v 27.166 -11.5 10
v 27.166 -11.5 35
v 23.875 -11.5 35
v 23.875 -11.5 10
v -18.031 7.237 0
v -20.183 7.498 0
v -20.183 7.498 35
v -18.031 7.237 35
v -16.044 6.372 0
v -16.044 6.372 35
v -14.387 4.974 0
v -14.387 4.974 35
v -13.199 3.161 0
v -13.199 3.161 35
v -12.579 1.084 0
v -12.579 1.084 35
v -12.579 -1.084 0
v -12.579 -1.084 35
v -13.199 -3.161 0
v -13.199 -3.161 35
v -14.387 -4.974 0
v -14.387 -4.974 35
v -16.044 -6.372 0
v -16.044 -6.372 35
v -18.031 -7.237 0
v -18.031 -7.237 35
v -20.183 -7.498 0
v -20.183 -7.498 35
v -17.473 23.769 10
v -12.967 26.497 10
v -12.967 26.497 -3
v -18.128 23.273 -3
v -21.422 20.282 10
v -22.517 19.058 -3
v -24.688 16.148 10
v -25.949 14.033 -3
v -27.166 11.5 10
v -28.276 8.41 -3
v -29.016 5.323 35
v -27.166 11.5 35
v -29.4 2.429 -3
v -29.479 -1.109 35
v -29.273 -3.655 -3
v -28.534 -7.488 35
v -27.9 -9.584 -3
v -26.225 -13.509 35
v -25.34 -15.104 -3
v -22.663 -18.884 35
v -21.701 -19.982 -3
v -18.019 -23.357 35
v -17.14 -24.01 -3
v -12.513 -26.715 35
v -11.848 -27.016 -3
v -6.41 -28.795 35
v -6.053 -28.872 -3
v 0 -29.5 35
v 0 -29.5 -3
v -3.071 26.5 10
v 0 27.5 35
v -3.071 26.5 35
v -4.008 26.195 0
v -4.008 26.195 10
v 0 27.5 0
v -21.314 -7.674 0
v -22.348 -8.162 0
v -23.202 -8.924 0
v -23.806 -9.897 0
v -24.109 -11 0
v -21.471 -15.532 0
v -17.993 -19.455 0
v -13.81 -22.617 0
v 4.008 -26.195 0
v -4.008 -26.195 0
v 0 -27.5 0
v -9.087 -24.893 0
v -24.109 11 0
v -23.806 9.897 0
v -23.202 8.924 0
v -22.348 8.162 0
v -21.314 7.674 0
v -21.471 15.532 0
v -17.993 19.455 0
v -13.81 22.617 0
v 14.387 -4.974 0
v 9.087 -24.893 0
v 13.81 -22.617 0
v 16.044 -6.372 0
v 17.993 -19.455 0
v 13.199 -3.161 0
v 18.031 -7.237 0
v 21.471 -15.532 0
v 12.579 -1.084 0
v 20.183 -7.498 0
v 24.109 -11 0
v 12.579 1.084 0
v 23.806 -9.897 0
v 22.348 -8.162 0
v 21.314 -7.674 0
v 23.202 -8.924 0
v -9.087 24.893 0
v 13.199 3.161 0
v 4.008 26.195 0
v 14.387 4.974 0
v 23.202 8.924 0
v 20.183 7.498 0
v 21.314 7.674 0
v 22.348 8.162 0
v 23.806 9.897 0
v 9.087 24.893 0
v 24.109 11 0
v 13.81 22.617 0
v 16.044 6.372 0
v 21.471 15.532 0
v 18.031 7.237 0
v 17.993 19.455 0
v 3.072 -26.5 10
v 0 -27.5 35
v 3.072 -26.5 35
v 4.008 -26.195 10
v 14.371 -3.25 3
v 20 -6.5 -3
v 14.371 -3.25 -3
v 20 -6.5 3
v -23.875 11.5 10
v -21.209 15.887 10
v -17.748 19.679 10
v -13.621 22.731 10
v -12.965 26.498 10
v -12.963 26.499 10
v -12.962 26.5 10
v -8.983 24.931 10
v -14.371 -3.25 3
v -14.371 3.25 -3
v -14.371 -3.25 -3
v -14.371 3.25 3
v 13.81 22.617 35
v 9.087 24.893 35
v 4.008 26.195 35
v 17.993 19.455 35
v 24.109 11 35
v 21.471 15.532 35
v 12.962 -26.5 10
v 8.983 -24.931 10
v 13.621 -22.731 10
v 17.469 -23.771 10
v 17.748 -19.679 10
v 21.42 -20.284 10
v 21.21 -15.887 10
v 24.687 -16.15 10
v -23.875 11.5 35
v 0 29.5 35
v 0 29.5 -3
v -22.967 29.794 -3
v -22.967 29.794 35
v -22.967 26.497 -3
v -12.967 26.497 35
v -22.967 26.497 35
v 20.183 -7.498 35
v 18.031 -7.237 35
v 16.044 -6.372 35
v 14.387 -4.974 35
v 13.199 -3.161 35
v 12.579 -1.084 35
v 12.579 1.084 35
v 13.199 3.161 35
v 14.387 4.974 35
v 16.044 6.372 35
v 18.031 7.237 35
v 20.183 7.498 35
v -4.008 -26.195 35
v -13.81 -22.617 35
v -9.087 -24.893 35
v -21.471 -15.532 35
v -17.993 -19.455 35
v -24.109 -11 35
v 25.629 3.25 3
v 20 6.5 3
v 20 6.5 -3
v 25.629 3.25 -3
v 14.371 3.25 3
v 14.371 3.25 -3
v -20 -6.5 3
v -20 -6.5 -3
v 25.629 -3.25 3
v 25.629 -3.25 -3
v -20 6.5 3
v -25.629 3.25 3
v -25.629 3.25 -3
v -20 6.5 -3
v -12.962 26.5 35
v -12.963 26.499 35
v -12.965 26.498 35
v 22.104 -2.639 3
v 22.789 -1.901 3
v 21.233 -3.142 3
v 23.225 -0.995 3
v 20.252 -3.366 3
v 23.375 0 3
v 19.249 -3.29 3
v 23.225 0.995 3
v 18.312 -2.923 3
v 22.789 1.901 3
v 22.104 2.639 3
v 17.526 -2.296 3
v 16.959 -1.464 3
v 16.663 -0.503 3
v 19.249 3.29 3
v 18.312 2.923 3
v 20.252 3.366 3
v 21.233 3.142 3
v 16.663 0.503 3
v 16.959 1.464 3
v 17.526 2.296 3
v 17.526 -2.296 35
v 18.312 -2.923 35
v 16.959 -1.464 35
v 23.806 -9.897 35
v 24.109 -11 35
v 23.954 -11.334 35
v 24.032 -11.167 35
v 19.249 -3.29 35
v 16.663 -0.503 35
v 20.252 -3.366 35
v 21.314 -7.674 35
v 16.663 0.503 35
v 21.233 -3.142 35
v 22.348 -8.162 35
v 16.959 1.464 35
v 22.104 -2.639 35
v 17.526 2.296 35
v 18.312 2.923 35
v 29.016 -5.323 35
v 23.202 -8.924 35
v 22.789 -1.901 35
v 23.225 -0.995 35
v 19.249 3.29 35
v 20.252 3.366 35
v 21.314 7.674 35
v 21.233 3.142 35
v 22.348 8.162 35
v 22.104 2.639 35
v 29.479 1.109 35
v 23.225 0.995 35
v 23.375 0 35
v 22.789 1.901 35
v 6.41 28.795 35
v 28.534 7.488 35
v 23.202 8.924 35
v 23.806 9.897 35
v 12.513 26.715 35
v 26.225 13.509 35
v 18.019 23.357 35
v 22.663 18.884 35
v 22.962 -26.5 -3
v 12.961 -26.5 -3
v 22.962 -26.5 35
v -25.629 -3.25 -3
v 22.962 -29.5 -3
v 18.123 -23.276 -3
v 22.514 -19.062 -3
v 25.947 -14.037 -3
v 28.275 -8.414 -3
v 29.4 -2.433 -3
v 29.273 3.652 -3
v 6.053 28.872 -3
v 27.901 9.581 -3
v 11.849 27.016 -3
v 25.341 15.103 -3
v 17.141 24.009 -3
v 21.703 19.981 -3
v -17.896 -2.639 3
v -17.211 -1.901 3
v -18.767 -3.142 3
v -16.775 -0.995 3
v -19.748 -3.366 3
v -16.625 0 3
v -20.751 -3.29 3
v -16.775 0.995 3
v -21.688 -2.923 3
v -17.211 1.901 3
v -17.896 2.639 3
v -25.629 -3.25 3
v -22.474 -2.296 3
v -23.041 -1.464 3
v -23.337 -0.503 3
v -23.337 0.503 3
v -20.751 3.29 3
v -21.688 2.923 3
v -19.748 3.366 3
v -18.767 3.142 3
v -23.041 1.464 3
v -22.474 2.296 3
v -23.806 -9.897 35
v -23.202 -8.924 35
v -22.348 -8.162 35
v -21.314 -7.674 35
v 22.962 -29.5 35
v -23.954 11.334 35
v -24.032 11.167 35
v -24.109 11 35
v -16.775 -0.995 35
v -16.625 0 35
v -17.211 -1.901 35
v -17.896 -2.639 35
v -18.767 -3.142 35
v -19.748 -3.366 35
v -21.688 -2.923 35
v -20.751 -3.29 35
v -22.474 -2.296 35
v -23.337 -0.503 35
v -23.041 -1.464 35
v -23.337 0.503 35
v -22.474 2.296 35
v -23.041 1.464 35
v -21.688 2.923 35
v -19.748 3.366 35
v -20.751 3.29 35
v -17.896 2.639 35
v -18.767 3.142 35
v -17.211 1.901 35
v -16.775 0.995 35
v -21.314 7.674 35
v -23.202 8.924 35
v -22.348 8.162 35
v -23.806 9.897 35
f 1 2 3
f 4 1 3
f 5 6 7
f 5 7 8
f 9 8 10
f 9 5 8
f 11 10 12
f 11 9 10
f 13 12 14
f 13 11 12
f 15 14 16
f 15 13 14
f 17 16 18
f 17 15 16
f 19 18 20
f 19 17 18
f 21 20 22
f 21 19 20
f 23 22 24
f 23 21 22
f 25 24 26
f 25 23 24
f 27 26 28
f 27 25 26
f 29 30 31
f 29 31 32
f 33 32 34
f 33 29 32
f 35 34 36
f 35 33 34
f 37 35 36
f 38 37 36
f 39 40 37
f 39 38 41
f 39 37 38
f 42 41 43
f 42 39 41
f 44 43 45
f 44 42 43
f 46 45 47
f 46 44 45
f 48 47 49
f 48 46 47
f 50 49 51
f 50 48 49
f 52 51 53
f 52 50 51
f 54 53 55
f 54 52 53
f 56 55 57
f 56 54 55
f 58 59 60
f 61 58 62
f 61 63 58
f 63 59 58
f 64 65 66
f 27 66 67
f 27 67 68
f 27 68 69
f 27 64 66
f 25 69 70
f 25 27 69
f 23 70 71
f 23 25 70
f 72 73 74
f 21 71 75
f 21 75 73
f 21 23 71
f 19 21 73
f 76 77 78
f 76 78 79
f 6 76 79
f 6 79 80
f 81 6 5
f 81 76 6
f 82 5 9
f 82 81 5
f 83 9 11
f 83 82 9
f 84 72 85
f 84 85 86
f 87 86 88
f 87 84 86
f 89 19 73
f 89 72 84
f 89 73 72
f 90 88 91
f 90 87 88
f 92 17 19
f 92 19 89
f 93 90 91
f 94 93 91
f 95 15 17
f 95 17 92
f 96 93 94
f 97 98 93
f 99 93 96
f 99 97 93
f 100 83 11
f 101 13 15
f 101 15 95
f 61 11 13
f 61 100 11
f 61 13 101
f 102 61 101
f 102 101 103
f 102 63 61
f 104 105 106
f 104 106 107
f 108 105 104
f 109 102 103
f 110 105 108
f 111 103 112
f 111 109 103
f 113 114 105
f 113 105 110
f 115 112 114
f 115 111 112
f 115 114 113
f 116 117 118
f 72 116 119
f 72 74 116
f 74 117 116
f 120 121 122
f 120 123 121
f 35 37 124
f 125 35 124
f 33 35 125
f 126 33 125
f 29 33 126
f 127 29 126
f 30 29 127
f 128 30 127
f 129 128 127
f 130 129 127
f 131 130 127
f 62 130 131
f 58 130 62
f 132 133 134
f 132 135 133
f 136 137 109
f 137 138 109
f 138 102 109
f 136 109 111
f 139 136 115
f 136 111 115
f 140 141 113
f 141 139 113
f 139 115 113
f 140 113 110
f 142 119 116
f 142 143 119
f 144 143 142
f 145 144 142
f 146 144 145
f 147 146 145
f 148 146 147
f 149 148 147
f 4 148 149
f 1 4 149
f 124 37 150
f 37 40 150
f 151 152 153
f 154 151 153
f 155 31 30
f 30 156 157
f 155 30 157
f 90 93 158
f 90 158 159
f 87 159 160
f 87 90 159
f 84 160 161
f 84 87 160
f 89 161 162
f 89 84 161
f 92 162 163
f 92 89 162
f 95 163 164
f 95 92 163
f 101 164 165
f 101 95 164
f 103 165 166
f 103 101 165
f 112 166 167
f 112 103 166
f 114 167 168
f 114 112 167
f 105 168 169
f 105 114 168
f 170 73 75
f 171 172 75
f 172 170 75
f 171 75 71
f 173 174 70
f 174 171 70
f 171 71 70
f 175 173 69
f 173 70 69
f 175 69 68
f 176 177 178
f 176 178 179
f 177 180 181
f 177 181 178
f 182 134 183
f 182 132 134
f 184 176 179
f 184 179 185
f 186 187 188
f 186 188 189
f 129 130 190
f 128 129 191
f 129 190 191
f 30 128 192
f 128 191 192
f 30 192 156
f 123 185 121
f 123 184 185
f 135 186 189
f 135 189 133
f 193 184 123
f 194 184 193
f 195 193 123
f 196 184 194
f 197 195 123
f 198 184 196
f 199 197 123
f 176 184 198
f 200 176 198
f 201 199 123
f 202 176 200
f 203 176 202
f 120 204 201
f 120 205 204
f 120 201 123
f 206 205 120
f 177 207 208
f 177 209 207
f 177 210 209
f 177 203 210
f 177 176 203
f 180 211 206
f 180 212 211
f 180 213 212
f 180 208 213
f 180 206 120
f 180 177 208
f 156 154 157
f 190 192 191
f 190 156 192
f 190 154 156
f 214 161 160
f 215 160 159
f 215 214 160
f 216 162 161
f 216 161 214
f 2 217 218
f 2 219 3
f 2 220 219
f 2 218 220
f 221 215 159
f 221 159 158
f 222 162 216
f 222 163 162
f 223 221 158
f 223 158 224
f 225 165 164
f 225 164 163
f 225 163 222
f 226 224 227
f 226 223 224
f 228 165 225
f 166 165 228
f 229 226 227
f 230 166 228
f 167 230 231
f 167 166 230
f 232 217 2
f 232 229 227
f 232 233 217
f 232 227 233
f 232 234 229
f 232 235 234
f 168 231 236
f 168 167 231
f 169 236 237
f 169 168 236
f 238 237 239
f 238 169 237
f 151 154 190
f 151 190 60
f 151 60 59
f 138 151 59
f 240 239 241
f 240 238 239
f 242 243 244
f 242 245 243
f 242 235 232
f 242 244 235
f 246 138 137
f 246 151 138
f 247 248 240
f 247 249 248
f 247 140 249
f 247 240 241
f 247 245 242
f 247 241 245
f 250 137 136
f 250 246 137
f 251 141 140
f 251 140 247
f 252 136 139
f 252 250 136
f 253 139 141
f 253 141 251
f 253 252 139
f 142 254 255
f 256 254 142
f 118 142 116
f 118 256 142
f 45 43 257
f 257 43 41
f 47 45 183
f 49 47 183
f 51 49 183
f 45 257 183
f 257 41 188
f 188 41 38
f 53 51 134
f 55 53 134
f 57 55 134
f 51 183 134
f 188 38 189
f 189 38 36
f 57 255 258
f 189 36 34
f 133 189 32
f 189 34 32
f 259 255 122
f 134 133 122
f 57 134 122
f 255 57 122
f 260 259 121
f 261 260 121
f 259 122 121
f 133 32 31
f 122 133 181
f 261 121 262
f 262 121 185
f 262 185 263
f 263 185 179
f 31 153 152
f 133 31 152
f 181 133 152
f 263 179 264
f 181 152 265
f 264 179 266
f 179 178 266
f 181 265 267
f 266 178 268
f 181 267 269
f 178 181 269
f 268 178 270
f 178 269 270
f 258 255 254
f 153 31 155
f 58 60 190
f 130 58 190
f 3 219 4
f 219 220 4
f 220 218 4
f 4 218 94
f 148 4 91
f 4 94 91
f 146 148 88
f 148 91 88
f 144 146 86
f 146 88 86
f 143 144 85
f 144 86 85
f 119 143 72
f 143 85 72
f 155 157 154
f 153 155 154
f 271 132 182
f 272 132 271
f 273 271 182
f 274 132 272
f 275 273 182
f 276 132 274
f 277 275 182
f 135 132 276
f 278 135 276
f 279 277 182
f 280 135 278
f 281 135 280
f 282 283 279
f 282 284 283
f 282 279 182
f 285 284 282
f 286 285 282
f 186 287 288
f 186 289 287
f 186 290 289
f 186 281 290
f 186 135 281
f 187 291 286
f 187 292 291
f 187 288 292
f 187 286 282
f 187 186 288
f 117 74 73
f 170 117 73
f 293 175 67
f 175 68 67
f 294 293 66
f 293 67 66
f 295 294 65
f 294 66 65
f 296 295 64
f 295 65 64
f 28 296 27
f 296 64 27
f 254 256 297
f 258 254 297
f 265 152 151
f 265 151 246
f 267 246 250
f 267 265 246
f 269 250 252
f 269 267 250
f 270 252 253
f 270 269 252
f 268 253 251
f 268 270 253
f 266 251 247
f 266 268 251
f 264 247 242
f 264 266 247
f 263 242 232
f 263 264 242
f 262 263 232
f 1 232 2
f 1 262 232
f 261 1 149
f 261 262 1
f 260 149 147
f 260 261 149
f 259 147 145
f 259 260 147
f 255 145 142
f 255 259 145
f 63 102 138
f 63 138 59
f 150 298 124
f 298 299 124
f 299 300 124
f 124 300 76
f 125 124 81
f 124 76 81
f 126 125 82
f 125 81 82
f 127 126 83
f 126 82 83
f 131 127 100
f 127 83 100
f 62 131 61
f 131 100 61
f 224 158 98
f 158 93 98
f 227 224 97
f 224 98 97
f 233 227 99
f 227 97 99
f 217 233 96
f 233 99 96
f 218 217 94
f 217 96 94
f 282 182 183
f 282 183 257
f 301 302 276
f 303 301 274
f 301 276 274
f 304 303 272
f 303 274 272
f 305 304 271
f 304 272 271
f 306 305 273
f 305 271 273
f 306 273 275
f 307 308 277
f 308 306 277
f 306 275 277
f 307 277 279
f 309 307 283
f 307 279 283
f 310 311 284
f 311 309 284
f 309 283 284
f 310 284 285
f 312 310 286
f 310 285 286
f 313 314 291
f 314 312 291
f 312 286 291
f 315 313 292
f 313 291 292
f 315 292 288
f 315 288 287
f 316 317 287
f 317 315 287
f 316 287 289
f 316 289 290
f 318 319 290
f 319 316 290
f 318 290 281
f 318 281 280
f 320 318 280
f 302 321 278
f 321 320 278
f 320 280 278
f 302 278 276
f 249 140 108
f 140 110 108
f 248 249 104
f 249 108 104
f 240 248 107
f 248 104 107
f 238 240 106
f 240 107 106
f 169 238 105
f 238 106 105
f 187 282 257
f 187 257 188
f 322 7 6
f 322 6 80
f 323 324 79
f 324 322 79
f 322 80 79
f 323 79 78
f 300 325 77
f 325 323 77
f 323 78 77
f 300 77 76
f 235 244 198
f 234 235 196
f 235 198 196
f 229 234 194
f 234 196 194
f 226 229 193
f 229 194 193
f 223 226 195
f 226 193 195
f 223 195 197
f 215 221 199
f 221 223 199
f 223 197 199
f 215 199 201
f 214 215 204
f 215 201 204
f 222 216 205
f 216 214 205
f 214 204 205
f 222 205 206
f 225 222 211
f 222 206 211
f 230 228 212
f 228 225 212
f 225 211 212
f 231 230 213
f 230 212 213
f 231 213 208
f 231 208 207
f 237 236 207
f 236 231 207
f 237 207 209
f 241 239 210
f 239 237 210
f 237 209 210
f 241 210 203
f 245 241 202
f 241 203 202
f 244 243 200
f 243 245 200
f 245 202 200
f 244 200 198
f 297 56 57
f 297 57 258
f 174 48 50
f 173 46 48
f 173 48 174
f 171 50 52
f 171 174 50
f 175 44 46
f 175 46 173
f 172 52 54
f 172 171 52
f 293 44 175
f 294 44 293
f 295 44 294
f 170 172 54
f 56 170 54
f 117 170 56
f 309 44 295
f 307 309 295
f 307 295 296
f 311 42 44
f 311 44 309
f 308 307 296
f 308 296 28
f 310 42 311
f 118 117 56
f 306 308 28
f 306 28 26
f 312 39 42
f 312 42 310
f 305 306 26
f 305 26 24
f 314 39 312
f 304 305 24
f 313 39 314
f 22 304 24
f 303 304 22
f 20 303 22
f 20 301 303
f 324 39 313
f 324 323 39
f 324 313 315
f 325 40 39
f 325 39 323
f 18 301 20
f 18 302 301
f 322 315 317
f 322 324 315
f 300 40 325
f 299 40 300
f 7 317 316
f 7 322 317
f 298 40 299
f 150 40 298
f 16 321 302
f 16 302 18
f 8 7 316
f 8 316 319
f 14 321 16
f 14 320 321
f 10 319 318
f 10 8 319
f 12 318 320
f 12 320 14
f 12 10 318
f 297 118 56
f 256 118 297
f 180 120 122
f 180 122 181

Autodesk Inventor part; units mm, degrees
ref_plane "YZ Plane" through (0, 0, 0) normal (1, 0, 0) x (0, 1, 0)
ref_plane "XZ Plane" through (0, 0, 0) normal (0, 1, 0) x (-1, 0, 0)
ref_plane "XY Plane" through (0, 0, 0) normal (0, 0, 1) x (1, 0, 0)
sketch "Sketch1" plane through (0, 0, 0) normal (0, 0, 1) x (1, 0, 0)
  circle A0 centre (0, 0) radius 29.5
  circle A1 centre (20, 0) radius 3.375
  circle A2 centre (-20, 0) radius 3.375
  line L0 (0, -27.5) -> (-4.0078, -26.1952)
  line L1 (0, -27.5) -> (4.0078, -26.1952)
  arc A3 (-24.1091, -11) -> (-4.0078, -26.1952) centre (0, 0) ccw
  arc A4 (4.0078, -26.1952) -> (24.1091, -11) centre (0, 0) ccw
  line L2 (4.0076, 26.1952) -> (0, 27.5)
  line L3 (0, 27.5) -> (-4.0076, 26.1952)
  arc A5 (24.1091, 11) -> (4.0076, 26.1952) centre (0, 0) ccw
  arc A6 (-4.0076, 26.1952) -> (-24.1091, 11) centre (0, 0) ccw
  arc A7 (20.1829, 7.4978) -> (20.1829, -7.4978) centre (20, 0) ccw
  arc A8 (-20.1829, -7.4978) -> (-20.1829, 7.4978) centre (-20, 0) ccw
  arc A9 (-20, -7.5) -> (-24.1091, -11) centre (-20.1402, -11.4975) ccw
  arc A10 (-24.1091, 11) -> (-20, 7.5) centre (-20.1402, 11.4975) ccw
  arc A11 (24.1091, -11) -> (20, -7.5) centre (20.1402, -11.4975) ccw
  arc A12 (20, 7.5) -> (24.1091, 11) centre (20.1402, 11.4975) ccw
  dimension "d46" = 59
  dimension "d49" = 6.75
  dimension "d50" = 6.75
  dimension "d105" = 4
  dimension "d106" = 4
  dimension "d107" = 4
  dimension "d109" = 4
extrude "Extrusion1" add sketch "Sketch1" along normal blind 35
sketch "Sketch9" plane through (0, 0, 0) normal (0, 0, -1) x (-1, 0, 0)
  circle A0 centre (-20, 0) radius 3.375
  circle A1 centre (20, 0) radius 3.375
  line L0 (20, -6.5) -> (25.6292, -3.25)
  line L1 (25.6292, -3.25) -> (25.6292, 3.25)
  line L2 (25.6292, 3.25) -> (20, 6.5)
  line L3 (20, 6.5) -> (14.3708, 3.25)
  line L4 (14.3708, 3.25) -> (14.3708, -3.25)
  line L5 (14.3708, -3.25) -> (20, -6.5)
  line L6 (-20, -6.5) -> (-14.3708, -3.25)
  line L7 (-14.3708, -3.25) -> (-14.3708, 3.25)
  line L8 (-14.3708, 3.25) -> (-20, 6.5)
  line L9 (-20, 6.5) -> (-25.6292, 3.25)
  line L10 (-25.6292, 3.25) -> (-25.6292, -3.25)
  line L11 (-25.6292, -3.25) -> (-20, -6.5)
  point P0 (0, 0)
  point P1 (0, 0)
extrude "Extrusion11" cut sketch "Sketch9" against normal blind 3
extrude "Extrusion12" add sketch "Sketch1" against normal blind 3 contours A0 | L0 A3 A9 A8 A10 A6 L3 L2 A5 A12 A7 A11 A4 L1
extrude "Extrusion13" cut sketch "Sketch9" along normal blind 3
sketch "Sketch10" plane through (0, 0, 35) normal (0, 0, 1) x (1, 0, 0)
  arc A0 (-24.1091, -11) -> (-4.0078, -26.1952) centre (0, 0) ccw projected
  line L0 (0, -26.5) -> (12.9615, -26.5)
  line L1 (27.1662, -11.5) -> (23.8747, -11.5)
  arc A1 (24.1091, 11) -> (4.0076, 26.1952) centre (0, 0) ccw projected
  line L2 (0, 26.5) -> (-12.9615, 26.5)
  line L3 (-27.1662, 11.5) -> (-23.8747, 11.5)
  arc A2 (12.9615, -26.5) -> (27.1662, -11.5) centre (0, 0) ccw
  arc A3 (-12.9615, 26.5) -> (-27.1662, 11.5) centre (0, 0) ccw
  arc A4 (0, -26.5) -> (23.8747, -11.5) centre (0, 0) ccw
  arc A5 (0, 26.5) -> (-23.8747, 11.5) centre (0, 0) ccw
  point P0 (24.1091, -11)
  point P1 (-24.1091, 11)
extrude "Extrusion14" cut sketch "Sketch10" against normal blind 25
sketch "Sketch11" plane through (0, 0, 35) normal (0, 0, 1) x (1, 0, 0)
  line L0 (12.9615, -26.5) -> (3.0715, -26.5) projected
  line L1 (12.9615, -26.5) -> (22.9615, -26.5)
  line L2 (22.9615, -26.5) -> (22.9615, -29.5)
  arc A0 (-27.1662, 11.5) -> (12.9615, -26.5) centre (0, 0) ccw projected
  line L3 (0, -29.5) -> (22.9615, -29.5)
  line L4 (12.9615, -26.5) -> (3.0715, -26.5)
  line L5 (3.0715, -26.5) -> (0, -27.5) projected
  line L6 (0, -27.5) -> (0, -29.5)
  circle A1 centre (0, 0) radius 29.5 projected
  line L7 (-12.9667, 26.4974) -> (-22.9667, 26.4974)
  line L8 (-22.9667, 26.4974) -> (-22.9667, 29.7944)
  line L9 (0, 29.5) -> (-22.9667, 29.7944)
  line L10 (-12.9667, 26.4974) -> (-3.0793, 26.4974)
  line L11 (0, 27.5) -> (-4.0076, 26.1952) projected
  line L12 (0, 27.5) -> (0, 29.5)
  dimension "d93" = 10
  dimension "d94" = 10
extrude "Extrusion15" add sketch "Sketch11" against normal blind 38 contours A0 L6 L5 L0 | L1 L2 L3 A0 | A1 L7 L8 L9
properties part number "BatteryIsolator"
